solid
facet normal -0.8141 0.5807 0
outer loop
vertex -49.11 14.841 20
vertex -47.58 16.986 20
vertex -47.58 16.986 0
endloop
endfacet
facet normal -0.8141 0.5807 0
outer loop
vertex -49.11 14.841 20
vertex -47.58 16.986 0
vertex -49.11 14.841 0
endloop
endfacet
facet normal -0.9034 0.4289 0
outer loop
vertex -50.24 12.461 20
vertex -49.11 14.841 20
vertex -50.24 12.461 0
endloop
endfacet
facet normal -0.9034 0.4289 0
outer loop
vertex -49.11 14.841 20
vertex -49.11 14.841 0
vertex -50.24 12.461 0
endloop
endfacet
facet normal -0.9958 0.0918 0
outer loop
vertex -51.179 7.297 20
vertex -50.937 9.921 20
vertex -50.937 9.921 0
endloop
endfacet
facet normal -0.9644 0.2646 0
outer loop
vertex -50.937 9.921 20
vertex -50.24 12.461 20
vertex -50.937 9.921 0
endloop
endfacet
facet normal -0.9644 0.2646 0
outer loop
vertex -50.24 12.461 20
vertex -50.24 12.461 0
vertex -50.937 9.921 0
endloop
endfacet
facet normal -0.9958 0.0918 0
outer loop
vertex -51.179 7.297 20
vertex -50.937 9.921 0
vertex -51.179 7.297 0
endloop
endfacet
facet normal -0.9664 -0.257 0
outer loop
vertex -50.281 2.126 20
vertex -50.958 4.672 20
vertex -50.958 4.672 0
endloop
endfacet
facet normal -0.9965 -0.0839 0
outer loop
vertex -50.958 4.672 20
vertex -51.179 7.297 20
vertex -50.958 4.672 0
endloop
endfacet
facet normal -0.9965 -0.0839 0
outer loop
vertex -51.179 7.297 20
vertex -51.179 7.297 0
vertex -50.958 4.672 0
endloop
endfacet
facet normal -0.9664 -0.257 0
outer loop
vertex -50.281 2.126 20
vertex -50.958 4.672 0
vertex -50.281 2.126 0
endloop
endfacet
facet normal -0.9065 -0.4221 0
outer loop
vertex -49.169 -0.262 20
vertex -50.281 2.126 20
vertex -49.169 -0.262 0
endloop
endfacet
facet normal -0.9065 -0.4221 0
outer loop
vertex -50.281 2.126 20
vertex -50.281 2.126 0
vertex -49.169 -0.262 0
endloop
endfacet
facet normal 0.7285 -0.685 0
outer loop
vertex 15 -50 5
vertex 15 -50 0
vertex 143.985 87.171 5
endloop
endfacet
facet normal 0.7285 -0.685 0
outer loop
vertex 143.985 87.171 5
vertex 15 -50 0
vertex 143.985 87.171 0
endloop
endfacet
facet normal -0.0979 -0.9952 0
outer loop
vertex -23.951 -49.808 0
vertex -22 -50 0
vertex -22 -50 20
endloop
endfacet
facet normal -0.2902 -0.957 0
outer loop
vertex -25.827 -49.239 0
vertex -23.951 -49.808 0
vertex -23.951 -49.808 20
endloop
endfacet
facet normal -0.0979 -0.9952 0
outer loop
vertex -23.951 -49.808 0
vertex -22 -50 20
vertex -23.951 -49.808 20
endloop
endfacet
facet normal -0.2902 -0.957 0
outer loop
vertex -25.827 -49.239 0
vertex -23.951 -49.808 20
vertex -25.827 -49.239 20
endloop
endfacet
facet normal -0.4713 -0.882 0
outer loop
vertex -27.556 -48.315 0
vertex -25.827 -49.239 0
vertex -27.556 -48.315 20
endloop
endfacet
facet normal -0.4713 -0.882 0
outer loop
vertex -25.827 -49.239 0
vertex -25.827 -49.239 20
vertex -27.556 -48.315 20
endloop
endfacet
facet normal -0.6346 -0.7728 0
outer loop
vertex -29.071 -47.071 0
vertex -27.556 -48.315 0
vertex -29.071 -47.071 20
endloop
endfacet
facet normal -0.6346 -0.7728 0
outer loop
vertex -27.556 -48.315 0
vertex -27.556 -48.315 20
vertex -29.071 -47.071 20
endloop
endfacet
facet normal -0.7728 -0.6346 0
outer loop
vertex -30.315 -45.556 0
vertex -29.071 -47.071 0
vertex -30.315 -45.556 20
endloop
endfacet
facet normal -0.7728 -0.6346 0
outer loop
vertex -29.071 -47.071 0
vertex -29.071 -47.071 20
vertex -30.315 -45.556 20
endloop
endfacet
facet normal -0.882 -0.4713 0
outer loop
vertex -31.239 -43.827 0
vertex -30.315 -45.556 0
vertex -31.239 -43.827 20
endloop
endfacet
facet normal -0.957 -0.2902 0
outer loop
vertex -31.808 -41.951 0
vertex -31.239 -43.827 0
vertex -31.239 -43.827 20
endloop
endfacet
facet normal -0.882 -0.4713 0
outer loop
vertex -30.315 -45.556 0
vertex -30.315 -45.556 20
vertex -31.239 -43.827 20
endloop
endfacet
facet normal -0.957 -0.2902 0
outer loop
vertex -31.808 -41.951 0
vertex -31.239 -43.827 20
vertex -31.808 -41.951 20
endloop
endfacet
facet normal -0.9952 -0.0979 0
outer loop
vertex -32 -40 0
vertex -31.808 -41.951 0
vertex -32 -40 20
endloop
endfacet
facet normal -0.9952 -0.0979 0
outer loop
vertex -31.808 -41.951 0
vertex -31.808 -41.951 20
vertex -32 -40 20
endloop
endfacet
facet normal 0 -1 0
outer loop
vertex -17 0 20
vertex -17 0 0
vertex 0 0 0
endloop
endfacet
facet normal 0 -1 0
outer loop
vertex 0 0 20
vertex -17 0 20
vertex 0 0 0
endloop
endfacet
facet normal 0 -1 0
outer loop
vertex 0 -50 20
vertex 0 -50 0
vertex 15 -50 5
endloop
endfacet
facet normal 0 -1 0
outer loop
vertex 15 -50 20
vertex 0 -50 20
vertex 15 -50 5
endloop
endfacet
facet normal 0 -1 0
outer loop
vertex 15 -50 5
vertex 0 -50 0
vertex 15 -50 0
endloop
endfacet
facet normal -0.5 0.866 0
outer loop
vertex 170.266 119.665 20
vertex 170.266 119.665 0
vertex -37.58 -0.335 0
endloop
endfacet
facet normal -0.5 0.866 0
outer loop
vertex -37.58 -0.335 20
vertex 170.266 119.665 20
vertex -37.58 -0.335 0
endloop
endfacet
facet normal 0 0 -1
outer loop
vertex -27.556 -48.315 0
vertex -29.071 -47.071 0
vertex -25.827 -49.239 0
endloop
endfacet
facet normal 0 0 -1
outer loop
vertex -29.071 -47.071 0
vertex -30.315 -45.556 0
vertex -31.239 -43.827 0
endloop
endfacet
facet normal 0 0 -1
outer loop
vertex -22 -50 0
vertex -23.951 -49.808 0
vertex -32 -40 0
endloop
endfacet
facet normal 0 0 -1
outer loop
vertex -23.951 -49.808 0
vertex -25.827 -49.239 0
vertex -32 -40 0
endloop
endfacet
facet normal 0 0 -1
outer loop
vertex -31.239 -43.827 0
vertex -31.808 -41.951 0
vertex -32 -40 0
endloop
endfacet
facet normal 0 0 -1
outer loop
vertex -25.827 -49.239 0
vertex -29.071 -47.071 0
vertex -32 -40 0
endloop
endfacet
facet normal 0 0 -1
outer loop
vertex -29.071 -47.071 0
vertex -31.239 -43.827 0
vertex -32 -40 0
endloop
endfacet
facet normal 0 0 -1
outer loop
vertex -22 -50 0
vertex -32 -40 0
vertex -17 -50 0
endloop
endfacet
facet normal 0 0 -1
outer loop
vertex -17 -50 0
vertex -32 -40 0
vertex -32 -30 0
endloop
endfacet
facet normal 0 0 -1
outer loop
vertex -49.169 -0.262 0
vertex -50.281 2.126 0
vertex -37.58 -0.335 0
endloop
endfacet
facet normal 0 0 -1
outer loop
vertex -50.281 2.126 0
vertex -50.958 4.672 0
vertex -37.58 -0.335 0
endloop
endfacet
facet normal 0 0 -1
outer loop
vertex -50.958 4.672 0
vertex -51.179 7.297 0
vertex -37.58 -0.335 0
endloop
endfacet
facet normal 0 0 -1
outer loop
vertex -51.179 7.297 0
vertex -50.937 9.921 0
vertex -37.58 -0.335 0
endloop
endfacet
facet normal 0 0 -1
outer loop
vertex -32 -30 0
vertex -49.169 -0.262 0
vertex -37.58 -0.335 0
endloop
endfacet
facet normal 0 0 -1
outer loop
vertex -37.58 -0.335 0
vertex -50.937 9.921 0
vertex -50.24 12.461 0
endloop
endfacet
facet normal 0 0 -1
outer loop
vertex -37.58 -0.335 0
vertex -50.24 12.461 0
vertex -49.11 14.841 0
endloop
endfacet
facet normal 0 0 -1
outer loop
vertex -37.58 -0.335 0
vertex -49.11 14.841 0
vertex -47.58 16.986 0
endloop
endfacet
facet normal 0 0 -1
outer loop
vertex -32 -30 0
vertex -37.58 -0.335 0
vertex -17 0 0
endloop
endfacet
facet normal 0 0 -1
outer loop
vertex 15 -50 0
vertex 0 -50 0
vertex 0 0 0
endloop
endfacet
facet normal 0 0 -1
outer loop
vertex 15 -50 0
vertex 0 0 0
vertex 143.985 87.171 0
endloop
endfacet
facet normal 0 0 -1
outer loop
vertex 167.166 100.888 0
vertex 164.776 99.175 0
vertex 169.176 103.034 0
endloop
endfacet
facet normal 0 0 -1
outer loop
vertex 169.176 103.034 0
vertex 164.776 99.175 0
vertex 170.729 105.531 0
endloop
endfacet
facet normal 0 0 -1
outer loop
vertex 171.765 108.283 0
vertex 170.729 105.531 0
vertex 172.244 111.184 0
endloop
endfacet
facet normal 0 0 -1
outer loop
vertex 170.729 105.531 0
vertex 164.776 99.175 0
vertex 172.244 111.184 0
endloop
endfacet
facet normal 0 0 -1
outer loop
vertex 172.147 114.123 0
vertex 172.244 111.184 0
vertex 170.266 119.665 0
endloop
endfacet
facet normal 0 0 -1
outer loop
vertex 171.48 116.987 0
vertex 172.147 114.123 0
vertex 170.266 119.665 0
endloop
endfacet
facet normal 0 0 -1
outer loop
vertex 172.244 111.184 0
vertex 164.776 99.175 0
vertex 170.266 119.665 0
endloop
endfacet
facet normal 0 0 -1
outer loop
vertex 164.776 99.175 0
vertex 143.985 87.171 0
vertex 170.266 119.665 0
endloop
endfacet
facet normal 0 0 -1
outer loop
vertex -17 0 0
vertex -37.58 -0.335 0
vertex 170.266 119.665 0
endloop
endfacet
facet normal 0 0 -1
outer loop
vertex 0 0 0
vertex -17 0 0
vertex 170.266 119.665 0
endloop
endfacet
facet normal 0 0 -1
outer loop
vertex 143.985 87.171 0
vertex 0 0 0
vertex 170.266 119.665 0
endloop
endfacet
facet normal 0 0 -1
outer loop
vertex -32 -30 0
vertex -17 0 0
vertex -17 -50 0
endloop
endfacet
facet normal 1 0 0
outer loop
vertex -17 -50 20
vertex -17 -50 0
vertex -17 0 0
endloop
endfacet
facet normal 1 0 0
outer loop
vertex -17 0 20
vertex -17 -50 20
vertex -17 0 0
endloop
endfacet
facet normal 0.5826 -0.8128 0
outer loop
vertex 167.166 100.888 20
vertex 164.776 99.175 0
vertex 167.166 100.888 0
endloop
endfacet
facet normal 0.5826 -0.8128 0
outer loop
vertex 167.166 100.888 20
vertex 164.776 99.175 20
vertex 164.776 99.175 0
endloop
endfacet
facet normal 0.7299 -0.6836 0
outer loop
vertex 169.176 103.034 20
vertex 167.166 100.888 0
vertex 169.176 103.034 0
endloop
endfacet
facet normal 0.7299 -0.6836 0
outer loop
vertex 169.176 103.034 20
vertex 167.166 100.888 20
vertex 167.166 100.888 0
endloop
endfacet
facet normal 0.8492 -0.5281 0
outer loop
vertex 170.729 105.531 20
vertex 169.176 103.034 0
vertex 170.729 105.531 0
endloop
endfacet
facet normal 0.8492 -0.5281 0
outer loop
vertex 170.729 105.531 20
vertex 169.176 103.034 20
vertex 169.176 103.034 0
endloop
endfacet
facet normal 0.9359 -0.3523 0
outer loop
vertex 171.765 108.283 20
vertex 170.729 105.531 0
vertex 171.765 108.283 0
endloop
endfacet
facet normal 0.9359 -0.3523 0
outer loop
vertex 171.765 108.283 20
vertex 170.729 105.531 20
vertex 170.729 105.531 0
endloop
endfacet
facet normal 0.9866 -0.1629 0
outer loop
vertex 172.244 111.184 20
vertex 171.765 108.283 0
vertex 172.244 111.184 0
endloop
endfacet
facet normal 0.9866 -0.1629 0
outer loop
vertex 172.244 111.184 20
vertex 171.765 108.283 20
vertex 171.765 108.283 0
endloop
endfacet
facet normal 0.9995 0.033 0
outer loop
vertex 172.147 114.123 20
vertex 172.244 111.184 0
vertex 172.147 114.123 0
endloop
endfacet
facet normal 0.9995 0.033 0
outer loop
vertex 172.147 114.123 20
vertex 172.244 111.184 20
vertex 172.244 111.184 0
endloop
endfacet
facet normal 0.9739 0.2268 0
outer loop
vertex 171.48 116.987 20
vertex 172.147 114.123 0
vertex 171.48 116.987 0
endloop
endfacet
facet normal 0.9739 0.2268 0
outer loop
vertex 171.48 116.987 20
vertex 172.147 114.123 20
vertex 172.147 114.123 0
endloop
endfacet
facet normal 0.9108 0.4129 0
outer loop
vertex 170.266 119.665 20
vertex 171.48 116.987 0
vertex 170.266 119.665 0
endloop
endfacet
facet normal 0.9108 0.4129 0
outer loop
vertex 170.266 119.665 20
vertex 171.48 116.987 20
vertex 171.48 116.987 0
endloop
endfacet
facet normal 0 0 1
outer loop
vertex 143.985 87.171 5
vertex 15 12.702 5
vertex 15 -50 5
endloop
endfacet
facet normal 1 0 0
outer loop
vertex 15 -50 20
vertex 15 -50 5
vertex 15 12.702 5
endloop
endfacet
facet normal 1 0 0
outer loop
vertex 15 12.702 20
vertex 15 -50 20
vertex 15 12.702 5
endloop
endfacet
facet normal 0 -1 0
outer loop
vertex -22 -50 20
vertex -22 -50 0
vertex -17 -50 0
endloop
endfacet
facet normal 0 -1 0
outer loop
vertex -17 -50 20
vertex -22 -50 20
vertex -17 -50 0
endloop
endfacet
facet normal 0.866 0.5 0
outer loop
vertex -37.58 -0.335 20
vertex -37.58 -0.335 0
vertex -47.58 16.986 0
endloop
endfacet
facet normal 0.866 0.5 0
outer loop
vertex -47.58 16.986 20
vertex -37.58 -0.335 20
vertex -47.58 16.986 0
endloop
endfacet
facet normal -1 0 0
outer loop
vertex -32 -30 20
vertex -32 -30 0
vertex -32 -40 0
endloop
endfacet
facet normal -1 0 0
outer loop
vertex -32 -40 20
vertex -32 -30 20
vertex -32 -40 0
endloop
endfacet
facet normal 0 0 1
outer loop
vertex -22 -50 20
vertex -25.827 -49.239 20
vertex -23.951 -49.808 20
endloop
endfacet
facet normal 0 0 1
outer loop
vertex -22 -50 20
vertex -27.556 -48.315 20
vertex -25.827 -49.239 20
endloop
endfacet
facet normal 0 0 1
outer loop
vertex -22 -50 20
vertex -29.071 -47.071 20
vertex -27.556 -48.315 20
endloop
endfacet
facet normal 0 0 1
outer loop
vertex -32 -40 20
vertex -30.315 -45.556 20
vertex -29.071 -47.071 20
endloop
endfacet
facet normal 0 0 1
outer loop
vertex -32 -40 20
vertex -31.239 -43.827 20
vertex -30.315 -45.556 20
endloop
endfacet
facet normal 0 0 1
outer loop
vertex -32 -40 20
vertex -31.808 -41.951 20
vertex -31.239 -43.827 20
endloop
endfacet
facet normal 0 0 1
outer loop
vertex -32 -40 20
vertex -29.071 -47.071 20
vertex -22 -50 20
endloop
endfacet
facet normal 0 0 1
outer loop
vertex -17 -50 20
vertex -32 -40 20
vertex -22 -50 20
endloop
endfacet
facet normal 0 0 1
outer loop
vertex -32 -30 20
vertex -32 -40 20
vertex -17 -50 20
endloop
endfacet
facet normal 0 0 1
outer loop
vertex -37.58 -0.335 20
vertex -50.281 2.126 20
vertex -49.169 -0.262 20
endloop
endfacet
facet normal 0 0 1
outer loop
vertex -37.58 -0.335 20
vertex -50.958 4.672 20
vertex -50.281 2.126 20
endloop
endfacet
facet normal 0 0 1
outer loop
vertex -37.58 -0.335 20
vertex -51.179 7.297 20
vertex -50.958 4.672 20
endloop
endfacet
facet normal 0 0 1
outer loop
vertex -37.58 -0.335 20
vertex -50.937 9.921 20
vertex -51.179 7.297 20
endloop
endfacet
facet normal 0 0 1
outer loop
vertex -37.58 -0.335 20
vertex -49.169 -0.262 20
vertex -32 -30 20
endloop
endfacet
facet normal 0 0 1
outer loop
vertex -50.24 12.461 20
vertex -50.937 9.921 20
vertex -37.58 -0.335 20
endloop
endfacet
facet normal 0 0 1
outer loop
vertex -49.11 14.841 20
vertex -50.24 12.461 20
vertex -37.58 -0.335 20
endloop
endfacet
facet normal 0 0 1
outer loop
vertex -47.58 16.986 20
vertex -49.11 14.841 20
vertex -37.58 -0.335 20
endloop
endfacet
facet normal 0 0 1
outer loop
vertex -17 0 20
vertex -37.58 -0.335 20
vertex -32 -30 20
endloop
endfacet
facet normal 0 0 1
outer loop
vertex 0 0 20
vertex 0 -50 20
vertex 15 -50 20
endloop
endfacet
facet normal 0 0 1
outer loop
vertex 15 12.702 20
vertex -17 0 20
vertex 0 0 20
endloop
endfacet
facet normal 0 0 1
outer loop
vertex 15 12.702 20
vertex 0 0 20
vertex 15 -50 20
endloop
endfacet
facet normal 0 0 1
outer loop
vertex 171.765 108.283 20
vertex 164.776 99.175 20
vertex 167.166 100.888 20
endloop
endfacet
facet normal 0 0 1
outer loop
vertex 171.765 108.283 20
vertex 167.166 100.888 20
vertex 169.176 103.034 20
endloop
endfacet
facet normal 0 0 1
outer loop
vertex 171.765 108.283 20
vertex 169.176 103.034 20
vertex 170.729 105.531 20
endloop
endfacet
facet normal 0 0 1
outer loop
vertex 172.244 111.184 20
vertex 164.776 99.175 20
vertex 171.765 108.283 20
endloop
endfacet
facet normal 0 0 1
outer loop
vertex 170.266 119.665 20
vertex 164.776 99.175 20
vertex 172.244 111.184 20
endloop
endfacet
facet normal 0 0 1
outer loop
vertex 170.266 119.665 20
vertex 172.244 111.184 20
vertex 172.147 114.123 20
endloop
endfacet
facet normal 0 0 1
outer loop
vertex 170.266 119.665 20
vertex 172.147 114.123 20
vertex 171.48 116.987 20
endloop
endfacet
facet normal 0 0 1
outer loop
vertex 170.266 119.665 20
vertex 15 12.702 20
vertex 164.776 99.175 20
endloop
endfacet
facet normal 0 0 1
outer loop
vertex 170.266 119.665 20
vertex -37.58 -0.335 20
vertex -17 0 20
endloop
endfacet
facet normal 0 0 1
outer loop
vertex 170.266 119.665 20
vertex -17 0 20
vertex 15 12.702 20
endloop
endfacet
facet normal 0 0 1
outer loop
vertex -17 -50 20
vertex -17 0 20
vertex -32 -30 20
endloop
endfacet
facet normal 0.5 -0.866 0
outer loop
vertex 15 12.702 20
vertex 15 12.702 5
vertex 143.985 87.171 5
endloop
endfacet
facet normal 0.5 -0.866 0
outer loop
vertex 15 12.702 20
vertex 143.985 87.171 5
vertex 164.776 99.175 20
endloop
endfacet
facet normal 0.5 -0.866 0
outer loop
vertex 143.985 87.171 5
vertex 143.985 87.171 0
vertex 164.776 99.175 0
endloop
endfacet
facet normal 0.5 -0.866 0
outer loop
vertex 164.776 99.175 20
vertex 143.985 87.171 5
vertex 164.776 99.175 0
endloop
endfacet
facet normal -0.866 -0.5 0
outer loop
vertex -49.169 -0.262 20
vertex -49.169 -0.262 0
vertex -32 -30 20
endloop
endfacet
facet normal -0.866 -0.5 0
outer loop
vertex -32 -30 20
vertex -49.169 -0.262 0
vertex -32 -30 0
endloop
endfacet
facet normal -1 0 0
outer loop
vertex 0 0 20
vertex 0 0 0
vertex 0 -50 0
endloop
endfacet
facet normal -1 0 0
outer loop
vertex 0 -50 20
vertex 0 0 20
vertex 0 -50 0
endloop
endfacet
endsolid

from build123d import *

# Parameters (mm, degrees)
BOSS_EXTRUDE1_DEPTH = 20
BOSS_EXTRUDE2_DEPTH = 5
FILLET1_R           = 15
FILLET2_R           = 10
FILLET3_R           = 15


# Some blends are built 0.0001 mm under size
with BuildPart() as part:
    # Sketch1 → Boss-Extrude1 (new body)
    with BuildSketch(Plane.XY):
        Polygon((0, 0), (0, -50), (15, -50), (15, 12.701705922), (177.765969889, 106.674682453), (170.265969889, 119.665063509), (-37.580127019, -0.334936491), (-47.580127019, 16.985571585), (-56.240381057, 11.985571585), (-32, -30), (-32, -50), (-17, -50), (-17, 0), align=None)
    extrude(amount=BOSS_EXTRUDE1_DEPTH)

    # Sketch2 → Boss-Extrude2 (add)
    with BuildSketch(Plane.XY):
        Polygon((15, -50), (143.985349671, 87.171432276), (15, 12.701705922), align=None)
    extrude(amount=BOSS_EXTRUDE2_DEPTH)

    # Fillet1
    # the kernel refuses this fillet: 15 mm, written as the material it takes off along each edge
    with BuildSketch(Plane(origin=(-56.240381057, 11.985571585, -35.355339059), x_dir=(0.866025403784439, 0.4999999999999994, 0), z_dir=(0, 0, 1))) as fillet1_piece_1:
        with BuildLine():
            CenterArc((15, -14.142135624), FILLET1_R, 109.471220634, 70.528779366)
            Line((0, -14.142135624), (-0.3, -14.142135624))
            Line((-0.3, -14.142135624), (-0.3, 0))
            Line((-0.3, 0), (0, 0.3))
            ThreePointArc((0, 0.3), (5, 0.3), (9.9, 0.282842712))
            Line((9.9, 0.282842712), (10, 0))
        make_face()
    extrude(amount=90.710678119, mode=Mode.SUBTRACT)

    # Fillet2
    fillet2_edges = [part.edges().sort_by_distance(p)[0] for p in [
        (-32, -50, 10),
    ]]
    fillet(fillet2_edges, radius=FILLET2_R)

    # Fillet3
    fillet3_edges = [part.edges().sort_by_distance(p)[0] for p in [
        (177.765969889, 106.674682453, 10),
    ]]
    fillet(fillet3_edges, radius=FILLET3_R - 0.0001)  # a hair under: the kernel refuses the full size


solid = part.part
